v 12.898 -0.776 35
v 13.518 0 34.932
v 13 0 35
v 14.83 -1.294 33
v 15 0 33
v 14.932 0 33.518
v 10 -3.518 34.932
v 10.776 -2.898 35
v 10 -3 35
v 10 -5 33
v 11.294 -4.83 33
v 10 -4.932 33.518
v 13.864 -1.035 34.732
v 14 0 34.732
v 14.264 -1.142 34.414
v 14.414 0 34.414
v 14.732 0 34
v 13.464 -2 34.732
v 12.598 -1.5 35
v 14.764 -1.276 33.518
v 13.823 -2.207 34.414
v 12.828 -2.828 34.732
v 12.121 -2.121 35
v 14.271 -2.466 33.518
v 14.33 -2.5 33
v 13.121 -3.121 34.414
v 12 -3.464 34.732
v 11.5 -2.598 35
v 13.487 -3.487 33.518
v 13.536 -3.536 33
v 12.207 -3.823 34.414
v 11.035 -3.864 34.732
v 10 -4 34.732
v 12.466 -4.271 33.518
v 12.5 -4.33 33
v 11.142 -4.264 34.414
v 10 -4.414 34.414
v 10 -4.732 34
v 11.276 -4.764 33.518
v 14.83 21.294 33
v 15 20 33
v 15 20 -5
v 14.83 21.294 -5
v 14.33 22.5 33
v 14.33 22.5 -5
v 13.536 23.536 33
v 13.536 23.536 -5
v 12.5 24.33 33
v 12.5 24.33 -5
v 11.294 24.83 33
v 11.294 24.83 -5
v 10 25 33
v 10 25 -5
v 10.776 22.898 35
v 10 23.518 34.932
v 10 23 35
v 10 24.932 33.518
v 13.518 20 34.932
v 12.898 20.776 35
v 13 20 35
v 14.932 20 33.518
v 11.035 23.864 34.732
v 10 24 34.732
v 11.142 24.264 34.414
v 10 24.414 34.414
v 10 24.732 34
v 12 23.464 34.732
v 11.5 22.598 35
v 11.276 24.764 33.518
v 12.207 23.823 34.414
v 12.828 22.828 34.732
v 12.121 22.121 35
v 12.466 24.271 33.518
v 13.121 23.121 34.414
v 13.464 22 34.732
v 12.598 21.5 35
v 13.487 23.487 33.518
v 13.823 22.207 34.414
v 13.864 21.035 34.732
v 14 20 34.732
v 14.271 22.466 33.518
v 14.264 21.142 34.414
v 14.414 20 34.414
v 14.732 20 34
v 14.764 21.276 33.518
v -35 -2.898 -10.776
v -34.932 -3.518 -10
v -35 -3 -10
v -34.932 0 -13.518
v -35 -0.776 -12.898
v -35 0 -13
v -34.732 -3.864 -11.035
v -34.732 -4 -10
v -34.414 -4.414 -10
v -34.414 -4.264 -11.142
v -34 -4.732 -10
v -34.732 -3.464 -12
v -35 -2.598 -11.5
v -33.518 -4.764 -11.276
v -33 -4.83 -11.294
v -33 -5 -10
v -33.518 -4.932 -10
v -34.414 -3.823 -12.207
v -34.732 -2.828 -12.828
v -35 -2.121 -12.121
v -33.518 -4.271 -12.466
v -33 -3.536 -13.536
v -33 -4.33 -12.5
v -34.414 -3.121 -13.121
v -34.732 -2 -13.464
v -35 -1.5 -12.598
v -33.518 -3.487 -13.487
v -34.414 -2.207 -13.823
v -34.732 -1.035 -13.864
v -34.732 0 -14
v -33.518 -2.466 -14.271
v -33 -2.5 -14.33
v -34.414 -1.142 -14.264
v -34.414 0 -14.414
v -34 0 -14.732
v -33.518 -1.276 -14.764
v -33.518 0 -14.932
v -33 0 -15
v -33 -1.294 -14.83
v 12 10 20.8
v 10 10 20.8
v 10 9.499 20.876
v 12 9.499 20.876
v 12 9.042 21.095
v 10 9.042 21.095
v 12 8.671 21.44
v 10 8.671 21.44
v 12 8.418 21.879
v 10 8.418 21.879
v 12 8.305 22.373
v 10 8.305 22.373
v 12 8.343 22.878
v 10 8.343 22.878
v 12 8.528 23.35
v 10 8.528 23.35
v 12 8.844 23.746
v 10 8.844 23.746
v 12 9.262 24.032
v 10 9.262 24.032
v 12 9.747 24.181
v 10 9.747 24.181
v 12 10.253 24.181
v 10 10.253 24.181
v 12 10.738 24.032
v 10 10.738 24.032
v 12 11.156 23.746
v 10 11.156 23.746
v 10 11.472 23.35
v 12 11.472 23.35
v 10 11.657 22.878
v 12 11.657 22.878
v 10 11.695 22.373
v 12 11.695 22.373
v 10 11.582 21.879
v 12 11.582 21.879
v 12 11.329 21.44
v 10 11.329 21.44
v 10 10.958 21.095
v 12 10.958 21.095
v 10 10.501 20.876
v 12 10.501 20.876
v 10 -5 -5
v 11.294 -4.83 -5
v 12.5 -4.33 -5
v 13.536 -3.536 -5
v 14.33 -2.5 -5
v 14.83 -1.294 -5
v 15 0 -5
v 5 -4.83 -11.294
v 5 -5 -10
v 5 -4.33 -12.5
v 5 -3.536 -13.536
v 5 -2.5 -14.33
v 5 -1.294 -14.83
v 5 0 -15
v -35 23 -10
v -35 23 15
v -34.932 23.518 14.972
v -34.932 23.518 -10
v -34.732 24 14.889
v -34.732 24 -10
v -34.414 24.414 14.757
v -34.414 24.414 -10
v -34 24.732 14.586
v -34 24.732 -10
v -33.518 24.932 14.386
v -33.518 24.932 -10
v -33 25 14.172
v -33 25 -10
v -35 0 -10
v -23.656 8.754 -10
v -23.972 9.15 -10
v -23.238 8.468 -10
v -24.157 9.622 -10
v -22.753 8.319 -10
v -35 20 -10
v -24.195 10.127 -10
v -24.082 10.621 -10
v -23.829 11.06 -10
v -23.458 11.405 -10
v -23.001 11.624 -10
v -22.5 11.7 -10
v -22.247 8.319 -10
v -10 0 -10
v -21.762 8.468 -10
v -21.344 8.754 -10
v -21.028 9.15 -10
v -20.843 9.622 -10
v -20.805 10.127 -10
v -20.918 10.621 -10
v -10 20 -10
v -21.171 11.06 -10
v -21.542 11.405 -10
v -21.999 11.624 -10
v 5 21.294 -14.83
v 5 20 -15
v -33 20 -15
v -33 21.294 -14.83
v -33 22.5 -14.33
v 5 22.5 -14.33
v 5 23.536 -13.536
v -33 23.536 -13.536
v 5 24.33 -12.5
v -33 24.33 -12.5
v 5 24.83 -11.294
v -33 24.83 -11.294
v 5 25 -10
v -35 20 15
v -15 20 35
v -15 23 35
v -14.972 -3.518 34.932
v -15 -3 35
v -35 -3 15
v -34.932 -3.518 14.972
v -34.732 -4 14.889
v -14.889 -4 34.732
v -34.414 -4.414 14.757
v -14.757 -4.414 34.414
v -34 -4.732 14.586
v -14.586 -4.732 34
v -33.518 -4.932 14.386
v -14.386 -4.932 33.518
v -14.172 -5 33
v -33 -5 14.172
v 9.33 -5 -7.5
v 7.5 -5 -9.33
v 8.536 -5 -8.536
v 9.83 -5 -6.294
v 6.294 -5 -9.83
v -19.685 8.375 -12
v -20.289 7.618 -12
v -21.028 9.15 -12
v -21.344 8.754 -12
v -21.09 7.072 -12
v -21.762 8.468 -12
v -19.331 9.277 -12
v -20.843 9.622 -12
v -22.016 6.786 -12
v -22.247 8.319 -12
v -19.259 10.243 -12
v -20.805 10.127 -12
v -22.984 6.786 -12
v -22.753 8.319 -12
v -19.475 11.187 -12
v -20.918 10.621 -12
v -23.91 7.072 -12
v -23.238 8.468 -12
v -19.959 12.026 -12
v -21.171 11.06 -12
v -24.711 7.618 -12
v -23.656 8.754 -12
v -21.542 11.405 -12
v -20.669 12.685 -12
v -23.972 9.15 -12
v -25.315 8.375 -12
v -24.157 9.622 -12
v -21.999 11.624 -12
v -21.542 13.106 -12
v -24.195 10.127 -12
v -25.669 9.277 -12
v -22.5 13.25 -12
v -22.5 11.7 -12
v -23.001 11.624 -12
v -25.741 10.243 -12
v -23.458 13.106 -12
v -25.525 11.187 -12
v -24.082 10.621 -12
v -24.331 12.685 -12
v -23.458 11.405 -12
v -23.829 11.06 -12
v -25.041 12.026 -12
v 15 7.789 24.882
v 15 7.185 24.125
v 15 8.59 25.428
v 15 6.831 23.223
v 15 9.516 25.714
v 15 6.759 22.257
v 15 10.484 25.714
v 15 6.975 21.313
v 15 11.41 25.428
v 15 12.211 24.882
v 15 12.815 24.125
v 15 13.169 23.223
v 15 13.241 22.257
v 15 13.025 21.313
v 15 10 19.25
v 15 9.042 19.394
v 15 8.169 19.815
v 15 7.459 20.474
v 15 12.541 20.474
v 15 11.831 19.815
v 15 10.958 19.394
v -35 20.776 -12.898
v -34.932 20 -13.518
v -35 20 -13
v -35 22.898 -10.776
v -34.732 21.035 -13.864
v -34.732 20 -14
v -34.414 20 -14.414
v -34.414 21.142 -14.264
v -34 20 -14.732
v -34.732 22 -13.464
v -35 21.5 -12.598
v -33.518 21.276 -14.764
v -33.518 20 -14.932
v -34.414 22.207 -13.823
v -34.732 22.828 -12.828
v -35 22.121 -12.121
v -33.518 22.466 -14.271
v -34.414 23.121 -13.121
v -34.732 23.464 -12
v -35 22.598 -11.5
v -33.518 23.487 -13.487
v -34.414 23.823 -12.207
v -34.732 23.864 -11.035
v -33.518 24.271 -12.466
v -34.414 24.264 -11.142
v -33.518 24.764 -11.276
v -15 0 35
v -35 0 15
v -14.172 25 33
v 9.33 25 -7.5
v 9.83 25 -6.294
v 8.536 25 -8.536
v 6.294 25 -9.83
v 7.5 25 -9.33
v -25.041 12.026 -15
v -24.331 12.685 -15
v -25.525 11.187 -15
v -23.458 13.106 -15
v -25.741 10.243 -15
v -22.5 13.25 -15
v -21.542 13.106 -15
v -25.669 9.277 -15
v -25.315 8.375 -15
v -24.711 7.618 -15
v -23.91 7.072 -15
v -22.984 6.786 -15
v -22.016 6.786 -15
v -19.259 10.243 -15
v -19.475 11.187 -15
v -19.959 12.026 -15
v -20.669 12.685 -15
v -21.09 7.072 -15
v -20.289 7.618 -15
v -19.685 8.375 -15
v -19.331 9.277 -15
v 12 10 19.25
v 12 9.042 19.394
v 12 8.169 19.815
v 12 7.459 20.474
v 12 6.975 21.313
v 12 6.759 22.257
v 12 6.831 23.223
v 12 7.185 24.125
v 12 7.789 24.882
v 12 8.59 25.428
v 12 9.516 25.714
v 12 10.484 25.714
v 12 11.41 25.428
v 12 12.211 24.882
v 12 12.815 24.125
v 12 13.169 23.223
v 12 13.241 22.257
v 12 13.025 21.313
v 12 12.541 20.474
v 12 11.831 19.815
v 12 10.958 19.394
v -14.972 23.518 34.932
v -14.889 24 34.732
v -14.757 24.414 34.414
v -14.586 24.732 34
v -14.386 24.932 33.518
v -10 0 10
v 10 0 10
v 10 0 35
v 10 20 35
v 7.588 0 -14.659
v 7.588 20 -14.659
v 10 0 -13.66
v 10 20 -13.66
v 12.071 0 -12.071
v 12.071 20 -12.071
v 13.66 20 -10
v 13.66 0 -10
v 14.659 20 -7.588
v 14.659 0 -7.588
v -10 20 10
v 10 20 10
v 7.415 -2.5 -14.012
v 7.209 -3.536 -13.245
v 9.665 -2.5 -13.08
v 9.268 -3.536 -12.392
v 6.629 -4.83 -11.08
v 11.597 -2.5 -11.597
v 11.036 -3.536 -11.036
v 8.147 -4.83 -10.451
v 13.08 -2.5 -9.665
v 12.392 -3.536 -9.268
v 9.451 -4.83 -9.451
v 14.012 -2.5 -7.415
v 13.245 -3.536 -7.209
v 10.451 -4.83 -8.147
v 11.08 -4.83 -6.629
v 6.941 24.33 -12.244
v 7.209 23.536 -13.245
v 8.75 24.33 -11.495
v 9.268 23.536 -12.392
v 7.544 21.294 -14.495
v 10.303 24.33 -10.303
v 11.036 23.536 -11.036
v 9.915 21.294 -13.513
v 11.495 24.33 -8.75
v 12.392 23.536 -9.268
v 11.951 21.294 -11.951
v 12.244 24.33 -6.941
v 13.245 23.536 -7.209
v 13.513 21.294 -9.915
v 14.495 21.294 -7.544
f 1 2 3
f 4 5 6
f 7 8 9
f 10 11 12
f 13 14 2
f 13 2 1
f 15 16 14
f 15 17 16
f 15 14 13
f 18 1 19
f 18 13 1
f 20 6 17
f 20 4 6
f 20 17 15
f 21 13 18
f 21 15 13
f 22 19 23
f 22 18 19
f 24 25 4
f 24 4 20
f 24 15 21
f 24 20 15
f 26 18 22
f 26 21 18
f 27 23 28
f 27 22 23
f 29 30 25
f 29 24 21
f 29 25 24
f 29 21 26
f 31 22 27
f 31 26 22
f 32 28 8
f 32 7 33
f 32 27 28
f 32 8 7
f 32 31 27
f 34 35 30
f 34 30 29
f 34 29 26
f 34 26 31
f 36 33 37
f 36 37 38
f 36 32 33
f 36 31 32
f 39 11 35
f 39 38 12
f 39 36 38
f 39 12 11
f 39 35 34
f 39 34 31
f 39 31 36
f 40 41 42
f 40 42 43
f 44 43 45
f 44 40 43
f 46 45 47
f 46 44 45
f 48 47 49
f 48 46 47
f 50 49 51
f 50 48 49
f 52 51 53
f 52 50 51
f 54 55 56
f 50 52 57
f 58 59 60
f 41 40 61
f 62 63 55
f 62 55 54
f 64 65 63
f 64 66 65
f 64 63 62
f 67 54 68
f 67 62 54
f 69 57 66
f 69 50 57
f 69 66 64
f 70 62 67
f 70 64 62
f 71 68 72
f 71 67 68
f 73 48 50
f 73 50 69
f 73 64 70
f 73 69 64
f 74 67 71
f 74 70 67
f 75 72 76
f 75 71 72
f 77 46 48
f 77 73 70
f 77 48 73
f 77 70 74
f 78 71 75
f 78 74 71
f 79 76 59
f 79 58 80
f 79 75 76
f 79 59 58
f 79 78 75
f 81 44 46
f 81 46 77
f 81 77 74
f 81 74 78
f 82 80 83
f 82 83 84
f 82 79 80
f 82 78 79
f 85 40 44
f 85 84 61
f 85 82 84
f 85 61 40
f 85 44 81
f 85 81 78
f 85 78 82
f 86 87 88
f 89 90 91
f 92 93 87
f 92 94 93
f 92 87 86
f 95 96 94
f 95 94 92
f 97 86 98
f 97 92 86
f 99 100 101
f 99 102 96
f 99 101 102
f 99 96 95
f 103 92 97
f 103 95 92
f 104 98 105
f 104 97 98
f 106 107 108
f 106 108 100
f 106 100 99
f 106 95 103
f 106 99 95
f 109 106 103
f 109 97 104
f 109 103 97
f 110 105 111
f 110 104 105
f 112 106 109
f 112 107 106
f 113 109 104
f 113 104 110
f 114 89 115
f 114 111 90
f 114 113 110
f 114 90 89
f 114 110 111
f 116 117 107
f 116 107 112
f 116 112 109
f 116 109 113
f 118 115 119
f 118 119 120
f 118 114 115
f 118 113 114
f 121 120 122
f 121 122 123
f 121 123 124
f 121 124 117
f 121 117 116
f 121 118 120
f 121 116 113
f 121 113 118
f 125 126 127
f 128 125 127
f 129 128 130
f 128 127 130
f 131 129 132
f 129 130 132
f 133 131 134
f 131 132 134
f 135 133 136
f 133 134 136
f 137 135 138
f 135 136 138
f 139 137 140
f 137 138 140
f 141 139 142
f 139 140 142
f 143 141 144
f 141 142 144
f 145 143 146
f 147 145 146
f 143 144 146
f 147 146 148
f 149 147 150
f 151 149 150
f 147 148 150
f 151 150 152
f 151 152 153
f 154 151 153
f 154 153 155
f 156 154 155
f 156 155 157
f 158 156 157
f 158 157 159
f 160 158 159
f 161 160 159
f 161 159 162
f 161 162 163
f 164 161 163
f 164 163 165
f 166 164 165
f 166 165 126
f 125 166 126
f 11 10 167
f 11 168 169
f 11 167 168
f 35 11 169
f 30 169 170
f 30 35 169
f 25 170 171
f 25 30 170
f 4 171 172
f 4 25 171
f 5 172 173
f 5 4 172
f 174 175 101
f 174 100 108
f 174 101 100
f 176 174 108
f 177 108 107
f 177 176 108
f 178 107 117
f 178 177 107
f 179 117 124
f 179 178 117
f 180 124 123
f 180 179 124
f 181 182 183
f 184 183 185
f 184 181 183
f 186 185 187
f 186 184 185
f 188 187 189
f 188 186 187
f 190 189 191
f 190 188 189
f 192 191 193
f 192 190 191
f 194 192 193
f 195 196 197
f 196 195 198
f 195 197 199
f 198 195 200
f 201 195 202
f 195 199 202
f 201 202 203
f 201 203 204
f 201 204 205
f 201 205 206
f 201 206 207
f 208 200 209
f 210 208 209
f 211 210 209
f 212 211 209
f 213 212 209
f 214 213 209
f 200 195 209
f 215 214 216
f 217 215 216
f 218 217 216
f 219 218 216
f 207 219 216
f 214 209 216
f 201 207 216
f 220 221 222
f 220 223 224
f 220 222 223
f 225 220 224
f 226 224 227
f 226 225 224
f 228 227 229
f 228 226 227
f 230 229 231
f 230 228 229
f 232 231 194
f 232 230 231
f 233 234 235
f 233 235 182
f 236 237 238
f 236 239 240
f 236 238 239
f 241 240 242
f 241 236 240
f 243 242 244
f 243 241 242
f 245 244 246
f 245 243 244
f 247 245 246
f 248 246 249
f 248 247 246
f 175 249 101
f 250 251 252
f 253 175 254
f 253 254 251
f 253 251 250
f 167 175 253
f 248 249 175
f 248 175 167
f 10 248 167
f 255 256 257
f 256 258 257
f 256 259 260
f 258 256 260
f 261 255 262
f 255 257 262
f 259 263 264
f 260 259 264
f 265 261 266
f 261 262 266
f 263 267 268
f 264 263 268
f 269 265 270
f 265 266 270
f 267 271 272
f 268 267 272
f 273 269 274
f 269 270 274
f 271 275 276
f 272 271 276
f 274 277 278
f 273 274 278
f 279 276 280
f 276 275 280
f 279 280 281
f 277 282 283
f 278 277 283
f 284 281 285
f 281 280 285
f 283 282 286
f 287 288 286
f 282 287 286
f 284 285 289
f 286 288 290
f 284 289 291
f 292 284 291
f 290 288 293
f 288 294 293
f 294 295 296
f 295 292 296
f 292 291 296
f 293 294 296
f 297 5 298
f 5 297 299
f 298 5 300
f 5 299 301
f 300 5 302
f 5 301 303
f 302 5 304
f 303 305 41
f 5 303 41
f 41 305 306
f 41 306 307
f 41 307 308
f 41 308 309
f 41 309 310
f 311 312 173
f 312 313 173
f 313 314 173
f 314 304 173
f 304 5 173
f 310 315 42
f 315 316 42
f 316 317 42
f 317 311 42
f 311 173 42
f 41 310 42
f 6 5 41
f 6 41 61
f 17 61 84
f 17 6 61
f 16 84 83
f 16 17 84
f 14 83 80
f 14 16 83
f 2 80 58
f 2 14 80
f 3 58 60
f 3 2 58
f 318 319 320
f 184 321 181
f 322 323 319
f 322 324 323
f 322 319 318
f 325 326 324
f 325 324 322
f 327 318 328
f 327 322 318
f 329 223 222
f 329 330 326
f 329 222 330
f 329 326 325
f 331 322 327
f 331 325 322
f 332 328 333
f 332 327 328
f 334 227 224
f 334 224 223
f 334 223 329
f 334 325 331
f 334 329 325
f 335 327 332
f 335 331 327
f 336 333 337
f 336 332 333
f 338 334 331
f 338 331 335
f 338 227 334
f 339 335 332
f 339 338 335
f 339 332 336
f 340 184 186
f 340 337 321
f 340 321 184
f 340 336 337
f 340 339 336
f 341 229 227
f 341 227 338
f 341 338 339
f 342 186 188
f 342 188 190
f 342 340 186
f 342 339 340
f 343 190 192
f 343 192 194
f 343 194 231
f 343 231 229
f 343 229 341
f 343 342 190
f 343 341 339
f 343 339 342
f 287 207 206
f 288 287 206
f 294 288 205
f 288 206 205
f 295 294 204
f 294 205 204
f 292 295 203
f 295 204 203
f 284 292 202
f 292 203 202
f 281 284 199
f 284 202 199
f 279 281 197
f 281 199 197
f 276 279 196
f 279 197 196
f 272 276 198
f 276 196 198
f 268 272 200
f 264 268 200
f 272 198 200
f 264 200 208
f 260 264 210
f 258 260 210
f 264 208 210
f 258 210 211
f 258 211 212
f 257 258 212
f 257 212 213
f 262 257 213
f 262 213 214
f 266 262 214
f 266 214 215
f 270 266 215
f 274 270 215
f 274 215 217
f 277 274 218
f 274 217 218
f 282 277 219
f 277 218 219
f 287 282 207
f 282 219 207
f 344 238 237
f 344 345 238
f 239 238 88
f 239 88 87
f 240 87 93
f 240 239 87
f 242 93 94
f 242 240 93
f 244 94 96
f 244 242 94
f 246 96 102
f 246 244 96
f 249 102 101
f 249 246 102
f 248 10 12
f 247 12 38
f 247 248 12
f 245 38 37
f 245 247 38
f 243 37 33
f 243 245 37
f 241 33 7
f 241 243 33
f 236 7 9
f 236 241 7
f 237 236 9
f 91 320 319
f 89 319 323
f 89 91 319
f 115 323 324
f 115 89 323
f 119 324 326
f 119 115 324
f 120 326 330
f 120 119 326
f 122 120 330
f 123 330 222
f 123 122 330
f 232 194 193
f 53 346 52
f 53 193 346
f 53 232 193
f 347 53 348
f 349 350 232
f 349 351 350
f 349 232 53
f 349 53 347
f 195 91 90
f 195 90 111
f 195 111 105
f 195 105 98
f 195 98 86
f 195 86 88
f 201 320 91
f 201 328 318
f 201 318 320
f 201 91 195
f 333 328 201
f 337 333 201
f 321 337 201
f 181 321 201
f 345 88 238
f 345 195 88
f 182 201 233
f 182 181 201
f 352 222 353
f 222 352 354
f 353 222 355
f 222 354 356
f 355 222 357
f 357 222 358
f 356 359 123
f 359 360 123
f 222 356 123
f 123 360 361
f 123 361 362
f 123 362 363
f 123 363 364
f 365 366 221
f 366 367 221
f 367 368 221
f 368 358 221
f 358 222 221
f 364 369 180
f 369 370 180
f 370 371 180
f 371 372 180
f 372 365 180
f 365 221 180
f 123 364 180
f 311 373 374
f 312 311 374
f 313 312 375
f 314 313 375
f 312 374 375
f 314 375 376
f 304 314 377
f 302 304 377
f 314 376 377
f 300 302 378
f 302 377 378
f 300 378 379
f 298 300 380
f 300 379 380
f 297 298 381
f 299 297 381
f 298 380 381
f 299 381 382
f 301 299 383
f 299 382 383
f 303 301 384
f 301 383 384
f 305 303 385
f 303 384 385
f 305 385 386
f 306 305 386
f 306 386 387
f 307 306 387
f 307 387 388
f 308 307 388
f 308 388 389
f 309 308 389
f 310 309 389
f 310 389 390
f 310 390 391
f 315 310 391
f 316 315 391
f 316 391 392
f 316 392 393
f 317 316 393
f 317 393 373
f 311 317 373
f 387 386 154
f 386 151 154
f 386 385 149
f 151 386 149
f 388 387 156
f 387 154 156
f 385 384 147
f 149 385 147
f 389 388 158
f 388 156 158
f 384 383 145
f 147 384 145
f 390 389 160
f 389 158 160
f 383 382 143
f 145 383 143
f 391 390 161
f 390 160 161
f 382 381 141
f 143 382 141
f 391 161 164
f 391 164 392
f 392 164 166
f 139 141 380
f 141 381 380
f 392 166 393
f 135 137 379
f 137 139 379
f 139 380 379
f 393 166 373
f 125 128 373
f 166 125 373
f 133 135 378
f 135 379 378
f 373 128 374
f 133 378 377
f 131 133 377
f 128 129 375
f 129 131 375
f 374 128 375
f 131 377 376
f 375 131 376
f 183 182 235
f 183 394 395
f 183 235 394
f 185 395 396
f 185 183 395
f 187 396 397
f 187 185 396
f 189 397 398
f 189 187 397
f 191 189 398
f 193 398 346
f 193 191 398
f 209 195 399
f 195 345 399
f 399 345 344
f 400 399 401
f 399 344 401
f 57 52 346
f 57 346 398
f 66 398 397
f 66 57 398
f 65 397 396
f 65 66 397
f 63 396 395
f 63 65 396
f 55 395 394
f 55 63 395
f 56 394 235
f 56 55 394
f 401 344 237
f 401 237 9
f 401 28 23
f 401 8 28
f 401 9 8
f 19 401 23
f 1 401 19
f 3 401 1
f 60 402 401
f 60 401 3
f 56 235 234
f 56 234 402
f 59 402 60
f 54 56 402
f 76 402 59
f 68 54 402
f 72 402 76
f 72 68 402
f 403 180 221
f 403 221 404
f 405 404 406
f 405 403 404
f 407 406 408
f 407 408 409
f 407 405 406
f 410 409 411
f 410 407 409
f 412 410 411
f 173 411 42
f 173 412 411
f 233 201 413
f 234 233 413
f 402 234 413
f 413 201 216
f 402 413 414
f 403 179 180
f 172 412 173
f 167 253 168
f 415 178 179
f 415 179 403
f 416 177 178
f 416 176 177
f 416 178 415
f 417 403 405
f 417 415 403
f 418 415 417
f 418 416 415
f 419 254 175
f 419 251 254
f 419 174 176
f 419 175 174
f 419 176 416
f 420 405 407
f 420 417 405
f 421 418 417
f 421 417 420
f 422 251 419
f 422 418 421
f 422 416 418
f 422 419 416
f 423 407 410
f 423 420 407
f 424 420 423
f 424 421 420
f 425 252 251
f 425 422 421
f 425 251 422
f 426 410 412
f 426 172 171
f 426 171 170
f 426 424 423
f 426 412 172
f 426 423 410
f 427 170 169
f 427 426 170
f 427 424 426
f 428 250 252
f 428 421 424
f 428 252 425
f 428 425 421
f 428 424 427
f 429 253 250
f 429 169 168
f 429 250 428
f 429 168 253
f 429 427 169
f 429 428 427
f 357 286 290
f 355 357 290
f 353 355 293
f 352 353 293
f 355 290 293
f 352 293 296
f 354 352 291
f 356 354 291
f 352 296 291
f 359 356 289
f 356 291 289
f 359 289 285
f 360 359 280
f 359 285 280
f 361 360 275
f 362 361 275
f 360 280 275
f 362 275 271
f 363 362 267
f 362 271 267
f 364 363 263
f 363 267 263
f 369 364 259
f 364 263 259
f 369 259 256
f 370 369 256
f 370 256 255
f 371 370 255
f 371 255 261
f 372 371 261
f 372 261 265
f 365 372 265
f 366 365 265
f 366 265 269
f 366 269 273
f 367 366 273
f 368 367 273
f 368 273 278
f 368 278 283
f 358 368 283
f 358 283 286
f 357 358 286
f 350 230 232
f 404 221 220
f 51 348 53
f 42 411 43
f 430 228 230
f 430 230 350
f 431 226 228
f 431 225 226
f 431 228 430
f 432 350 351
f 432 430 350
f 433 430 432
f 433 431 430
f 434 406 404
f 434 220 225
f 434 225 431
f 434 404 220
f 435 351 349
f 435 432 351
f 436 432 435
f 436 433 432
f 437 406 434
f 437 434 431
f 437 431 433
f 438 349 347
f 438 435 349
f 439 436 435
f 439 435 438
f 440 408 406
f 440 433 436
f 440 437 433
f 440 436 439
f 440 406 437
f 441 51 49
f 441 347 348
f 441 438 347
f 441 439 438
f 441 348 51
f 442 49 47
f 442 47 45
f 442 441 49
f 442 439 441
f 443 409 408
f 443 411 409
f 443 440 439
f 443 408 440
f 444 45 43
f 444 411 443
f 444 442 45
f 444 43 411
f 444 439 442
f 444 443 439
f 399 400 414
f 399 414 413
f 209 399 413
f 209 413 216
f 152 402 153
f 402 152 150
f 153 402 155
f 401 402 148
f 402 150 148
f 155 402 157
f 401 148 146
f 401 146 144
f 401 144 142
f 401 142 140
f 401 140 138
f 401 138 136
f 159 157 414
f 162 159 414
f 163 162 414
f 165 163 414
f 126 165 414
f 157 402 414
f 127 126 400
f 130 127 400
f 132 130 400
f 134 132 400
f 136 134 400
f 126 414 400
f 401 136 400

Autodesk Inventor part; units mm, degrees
ref_plane "YZ Plane" through (0, 0, 0) normal (1, 0, 0) x (0, 1, 0)
ref_plane "XZ Plane" through (0, 0, 0) normal (0, 1, 0) x (-1, 0, 0)
ref_plane "XY Plane" through (0, 0, 0) normal (0, 0, 1) x (1, 0, 0)
sketch "Sketch1" plane through (0, 0, 0) normal (0, 1, 0) x (-1, 0, 0)
  line L0 (-10, 10) -> (10, 10)
  line L1 (10, 10) -> (10, -10)
  line L2 (10, -10) -> (-10, -10)
  line L3 (-10, -10) -> (-10, 10)
  point P0 (0, 0)
  dimension "d0" = 20
  dimension "d1" = 20
  dimension "d2" = 10
  dimension "d3" = 10
extrude "Extrusion1" add sketch "Sketch1" along normal blind 20
sketch "Sketch2" plane through (0, 0, 0) normal (0, -1, 0) x (1, 0, 0)
  line L0 (15, -15) -> (-35, -15)
  line L1 (-35, -15) -> (-35, 15)
  line L2 (-35, 15) -> (-15, 35)
  line L3 (-15, 35) -> (15, 35)
  line L4 (15, 35) -> (15, -15)
  line L5 (10, -10) -> (-10, -10) projected
  line L6 (10, 10) -> (10, -10) projected
  point P0 (0, 0)
  dimension "d6" = 5
  dimension "d7" = 5
  dimension "d8" = 135
  dimension "d9" = 30
  dimension "d10" = 30
  dimension "d11" = 50
extrude "Extrusion2" add sketch "Sketch2" along normal blind 5
sketch "Sketch4" plane through (0, 0, 0) normal (0, 1, 0) x (1, 0, 0)
  point P0 (0, 0)
sketch "Sketch5" plane through (0, 0, 0) normal (0, 1, 0) x (1, 0, 0)
  point P0 (0, 0)
sketch "Sketch6" plane through (0, 0, 0) normal (0, 1, 0) x (1, 0, 0)
  line L0 (10, -30) -> (10, 10)
  line L1 (10, 10) -> (-30, 10)
  line L2 (-30, 10) -> (-30, 15)
  line L3 (-30, 15) -> (15, 15)
  line L4 (15, 15) -> (15, -30)
  line L5 (15, -30) -> (10, -30)
  line L6 (15, -35) -> (-15, -35) projected
  line L7 (-35, -15) -> (-35, 15) projected
  point P0 (0, 0)
  dimension "d18" = 5
  dimension "d21" = 5
extrude "Extrusion4" add sketch "Sketch6" along normal blind 20
sketch "Sketch7" plane through (0, 20, 0) normal (0, 1, 0) x (1, 0, 0)
  line L0 (-10, 10) -> (-30, 10) projected
  line L1 (-30, 10) -> (-30, 15) projected
  line L2 (-35, 15) -> (-30, 15) projected
  line L3 (-35, -15) -> (-35, 15) projected
  line L4 (-15, -35) -> (-35, -15) projected
  line L5 (15, -35) -> (-15, -35) projected
  line L6 (15, -30) -> (15, -35) projected
  line L7 (15, -30) -> (10, -30) projected
  line L8 (10, -30) -> (10, -10) projected
  line L9 (-10, -10) -> (10, -10) projected
  line L10 (-10, 10) -> (-10, -10) projected
  line L11 (-10, 10) -> (-10, -10) projected
  line L12 (-10, -10) -> (10, -10) projected
  line L13 (10, -10) -> (10, -30) projected
  line L14 (10, -30) -> (15, -30) projected
  line L15 (15, -30) -> (15, 15) projected
  line L16 (15, 15) -> (-30, 15) projected
  line L17 (-30, 15) -> (-30, 10) projected
  line L18 (-30, 10) -> (-10, 10) projected
  line L19 (15, -35) -> (-15, -35)
  line L20 (-15, -35) -> (-35, -15)
  line L21 (-35, -15) -> (-35, 15)
  line L22 (-35, 15) -> (15, 15)
  line L23 (15, 15) -> (15, -35)
  point P0 (0, 0)
extrude "Extrusion5" add sketch "Sketch7" along normal blind 5
sketch "Sketch8" plane through (10, 0, 30) normal (0, 0, 1) x (1, 0, 0)
  line L0 (5, 20) -> (0, 20)
  line L1 (0, 20) -> (0, 0)
  line L2 (0, 0) -> (5, 0)
  line L3 (5, 0) -> (5, 20)
  point P0 (-10, 0)
extrude "Extrusion6" add sketch "Sketch8" along normal blind 5
sketch "Sketch9" plane through (-30, 0, -15) normal (-1, 0, 0) x (0, 0, 1)
  line L0 (5, 20) -> (0, 20)
  line L1 (0, 20) -> (0, 0)
  line L2 (0, 0) -> (5, 0)
  line L3 (5, 0) -> (5, 20)
  point P0 (15, 0)
extrude "Extrusion7" add sketch "Sketch9" along normal blind 5
sketch "Sketch13" plane through (15, -5, -15) normal (0, 0, -1) x (-1, 0, 0)
  line L0 (25, 5) -> (25, 25) projected
  line L1 (50, 25) -> (25, 25) projected
  line L2 (50, 5) -> (50, 25) projected
  line L3 (25, 5) -> (50, 5) projected
  line L4 (37.5, 5) -> (50, 5) construction
  line L5 (50, 5) -> (50, 15) construction
  line L6 (50, 15) -> (37.5, 15) construction
  line L7 (37.5, 15) -> (37.5, 5) construction
  point P0 (15, 5)
  dimension "d32" = 12.5
  dimension "d33" = 10
sketch "Sketch14" plane through (15, -5, 35) normal (1, 0, 0) x (0, 0, -1)
  line L0 (25, 5) -> (25, 25) projected
  line L1 (0, 5) -> (25, 5) projected
  line L2 (0, 25) -> (0, 5) projected
  line L3 (25, 25) -> (0, 25) projected
  line L4 (12.5, 15) -> (0, 15) construction
  line L5 (0, 15) -> (0, 25) construction
  line L6 (0, 25) -> (12.5, 25) construction
  line L7 (12.5, 25) -> (12.5, 15) construction
  point P0 (35, 5)
  dimension "d34" = 12.5
  dimension "d35" = 10
hole "Hole1" at (15, 10, 22.5) direction (-1, 0, 0) diameter 3.4 end through all counterbore diameter 6.5 counterbore depth 3 clearance for "Socket Head Cap Screw ISO 4762" size "M3" standard "ISO"
hole "Hole2" at (-22.5, 10, -15) direction (0, 0, 1) diameter 3.4 end through all counterbore diameter 6.5 counterbore depth 3 clearance for "Socket Head Cap Screw ISO 4762" size "M3" standard "ISO"
fillet "Fillet1" radius 10 1 edges at (15, 10, -15)
fillet "Fillet2" radius 5 6 edges at (12.0711, -5, -12.0711) (15, -5, 15) (-15, -5, -15) (12.0711, 25, -12.0711) (15, 25, 15) (-15, 25, -15)
fillet "Fillet3" radius 2 12 edges at (-25, 25, 25) (13.5355, 23.5355, 35) (15, 10, 35) (13.5355, -3.5355, 35) (-2.5, -5, 35) (-2.5, 25, 35) (-25, -5, 25) (-35, -3.5355, -13.5355) (-35, 10, -15) (-35, 23.5355, -13.5355) (-35, 25, 2.5) (-35, -5, 2.5)
properties part number "flat_corner" material "ABS Plastic"
